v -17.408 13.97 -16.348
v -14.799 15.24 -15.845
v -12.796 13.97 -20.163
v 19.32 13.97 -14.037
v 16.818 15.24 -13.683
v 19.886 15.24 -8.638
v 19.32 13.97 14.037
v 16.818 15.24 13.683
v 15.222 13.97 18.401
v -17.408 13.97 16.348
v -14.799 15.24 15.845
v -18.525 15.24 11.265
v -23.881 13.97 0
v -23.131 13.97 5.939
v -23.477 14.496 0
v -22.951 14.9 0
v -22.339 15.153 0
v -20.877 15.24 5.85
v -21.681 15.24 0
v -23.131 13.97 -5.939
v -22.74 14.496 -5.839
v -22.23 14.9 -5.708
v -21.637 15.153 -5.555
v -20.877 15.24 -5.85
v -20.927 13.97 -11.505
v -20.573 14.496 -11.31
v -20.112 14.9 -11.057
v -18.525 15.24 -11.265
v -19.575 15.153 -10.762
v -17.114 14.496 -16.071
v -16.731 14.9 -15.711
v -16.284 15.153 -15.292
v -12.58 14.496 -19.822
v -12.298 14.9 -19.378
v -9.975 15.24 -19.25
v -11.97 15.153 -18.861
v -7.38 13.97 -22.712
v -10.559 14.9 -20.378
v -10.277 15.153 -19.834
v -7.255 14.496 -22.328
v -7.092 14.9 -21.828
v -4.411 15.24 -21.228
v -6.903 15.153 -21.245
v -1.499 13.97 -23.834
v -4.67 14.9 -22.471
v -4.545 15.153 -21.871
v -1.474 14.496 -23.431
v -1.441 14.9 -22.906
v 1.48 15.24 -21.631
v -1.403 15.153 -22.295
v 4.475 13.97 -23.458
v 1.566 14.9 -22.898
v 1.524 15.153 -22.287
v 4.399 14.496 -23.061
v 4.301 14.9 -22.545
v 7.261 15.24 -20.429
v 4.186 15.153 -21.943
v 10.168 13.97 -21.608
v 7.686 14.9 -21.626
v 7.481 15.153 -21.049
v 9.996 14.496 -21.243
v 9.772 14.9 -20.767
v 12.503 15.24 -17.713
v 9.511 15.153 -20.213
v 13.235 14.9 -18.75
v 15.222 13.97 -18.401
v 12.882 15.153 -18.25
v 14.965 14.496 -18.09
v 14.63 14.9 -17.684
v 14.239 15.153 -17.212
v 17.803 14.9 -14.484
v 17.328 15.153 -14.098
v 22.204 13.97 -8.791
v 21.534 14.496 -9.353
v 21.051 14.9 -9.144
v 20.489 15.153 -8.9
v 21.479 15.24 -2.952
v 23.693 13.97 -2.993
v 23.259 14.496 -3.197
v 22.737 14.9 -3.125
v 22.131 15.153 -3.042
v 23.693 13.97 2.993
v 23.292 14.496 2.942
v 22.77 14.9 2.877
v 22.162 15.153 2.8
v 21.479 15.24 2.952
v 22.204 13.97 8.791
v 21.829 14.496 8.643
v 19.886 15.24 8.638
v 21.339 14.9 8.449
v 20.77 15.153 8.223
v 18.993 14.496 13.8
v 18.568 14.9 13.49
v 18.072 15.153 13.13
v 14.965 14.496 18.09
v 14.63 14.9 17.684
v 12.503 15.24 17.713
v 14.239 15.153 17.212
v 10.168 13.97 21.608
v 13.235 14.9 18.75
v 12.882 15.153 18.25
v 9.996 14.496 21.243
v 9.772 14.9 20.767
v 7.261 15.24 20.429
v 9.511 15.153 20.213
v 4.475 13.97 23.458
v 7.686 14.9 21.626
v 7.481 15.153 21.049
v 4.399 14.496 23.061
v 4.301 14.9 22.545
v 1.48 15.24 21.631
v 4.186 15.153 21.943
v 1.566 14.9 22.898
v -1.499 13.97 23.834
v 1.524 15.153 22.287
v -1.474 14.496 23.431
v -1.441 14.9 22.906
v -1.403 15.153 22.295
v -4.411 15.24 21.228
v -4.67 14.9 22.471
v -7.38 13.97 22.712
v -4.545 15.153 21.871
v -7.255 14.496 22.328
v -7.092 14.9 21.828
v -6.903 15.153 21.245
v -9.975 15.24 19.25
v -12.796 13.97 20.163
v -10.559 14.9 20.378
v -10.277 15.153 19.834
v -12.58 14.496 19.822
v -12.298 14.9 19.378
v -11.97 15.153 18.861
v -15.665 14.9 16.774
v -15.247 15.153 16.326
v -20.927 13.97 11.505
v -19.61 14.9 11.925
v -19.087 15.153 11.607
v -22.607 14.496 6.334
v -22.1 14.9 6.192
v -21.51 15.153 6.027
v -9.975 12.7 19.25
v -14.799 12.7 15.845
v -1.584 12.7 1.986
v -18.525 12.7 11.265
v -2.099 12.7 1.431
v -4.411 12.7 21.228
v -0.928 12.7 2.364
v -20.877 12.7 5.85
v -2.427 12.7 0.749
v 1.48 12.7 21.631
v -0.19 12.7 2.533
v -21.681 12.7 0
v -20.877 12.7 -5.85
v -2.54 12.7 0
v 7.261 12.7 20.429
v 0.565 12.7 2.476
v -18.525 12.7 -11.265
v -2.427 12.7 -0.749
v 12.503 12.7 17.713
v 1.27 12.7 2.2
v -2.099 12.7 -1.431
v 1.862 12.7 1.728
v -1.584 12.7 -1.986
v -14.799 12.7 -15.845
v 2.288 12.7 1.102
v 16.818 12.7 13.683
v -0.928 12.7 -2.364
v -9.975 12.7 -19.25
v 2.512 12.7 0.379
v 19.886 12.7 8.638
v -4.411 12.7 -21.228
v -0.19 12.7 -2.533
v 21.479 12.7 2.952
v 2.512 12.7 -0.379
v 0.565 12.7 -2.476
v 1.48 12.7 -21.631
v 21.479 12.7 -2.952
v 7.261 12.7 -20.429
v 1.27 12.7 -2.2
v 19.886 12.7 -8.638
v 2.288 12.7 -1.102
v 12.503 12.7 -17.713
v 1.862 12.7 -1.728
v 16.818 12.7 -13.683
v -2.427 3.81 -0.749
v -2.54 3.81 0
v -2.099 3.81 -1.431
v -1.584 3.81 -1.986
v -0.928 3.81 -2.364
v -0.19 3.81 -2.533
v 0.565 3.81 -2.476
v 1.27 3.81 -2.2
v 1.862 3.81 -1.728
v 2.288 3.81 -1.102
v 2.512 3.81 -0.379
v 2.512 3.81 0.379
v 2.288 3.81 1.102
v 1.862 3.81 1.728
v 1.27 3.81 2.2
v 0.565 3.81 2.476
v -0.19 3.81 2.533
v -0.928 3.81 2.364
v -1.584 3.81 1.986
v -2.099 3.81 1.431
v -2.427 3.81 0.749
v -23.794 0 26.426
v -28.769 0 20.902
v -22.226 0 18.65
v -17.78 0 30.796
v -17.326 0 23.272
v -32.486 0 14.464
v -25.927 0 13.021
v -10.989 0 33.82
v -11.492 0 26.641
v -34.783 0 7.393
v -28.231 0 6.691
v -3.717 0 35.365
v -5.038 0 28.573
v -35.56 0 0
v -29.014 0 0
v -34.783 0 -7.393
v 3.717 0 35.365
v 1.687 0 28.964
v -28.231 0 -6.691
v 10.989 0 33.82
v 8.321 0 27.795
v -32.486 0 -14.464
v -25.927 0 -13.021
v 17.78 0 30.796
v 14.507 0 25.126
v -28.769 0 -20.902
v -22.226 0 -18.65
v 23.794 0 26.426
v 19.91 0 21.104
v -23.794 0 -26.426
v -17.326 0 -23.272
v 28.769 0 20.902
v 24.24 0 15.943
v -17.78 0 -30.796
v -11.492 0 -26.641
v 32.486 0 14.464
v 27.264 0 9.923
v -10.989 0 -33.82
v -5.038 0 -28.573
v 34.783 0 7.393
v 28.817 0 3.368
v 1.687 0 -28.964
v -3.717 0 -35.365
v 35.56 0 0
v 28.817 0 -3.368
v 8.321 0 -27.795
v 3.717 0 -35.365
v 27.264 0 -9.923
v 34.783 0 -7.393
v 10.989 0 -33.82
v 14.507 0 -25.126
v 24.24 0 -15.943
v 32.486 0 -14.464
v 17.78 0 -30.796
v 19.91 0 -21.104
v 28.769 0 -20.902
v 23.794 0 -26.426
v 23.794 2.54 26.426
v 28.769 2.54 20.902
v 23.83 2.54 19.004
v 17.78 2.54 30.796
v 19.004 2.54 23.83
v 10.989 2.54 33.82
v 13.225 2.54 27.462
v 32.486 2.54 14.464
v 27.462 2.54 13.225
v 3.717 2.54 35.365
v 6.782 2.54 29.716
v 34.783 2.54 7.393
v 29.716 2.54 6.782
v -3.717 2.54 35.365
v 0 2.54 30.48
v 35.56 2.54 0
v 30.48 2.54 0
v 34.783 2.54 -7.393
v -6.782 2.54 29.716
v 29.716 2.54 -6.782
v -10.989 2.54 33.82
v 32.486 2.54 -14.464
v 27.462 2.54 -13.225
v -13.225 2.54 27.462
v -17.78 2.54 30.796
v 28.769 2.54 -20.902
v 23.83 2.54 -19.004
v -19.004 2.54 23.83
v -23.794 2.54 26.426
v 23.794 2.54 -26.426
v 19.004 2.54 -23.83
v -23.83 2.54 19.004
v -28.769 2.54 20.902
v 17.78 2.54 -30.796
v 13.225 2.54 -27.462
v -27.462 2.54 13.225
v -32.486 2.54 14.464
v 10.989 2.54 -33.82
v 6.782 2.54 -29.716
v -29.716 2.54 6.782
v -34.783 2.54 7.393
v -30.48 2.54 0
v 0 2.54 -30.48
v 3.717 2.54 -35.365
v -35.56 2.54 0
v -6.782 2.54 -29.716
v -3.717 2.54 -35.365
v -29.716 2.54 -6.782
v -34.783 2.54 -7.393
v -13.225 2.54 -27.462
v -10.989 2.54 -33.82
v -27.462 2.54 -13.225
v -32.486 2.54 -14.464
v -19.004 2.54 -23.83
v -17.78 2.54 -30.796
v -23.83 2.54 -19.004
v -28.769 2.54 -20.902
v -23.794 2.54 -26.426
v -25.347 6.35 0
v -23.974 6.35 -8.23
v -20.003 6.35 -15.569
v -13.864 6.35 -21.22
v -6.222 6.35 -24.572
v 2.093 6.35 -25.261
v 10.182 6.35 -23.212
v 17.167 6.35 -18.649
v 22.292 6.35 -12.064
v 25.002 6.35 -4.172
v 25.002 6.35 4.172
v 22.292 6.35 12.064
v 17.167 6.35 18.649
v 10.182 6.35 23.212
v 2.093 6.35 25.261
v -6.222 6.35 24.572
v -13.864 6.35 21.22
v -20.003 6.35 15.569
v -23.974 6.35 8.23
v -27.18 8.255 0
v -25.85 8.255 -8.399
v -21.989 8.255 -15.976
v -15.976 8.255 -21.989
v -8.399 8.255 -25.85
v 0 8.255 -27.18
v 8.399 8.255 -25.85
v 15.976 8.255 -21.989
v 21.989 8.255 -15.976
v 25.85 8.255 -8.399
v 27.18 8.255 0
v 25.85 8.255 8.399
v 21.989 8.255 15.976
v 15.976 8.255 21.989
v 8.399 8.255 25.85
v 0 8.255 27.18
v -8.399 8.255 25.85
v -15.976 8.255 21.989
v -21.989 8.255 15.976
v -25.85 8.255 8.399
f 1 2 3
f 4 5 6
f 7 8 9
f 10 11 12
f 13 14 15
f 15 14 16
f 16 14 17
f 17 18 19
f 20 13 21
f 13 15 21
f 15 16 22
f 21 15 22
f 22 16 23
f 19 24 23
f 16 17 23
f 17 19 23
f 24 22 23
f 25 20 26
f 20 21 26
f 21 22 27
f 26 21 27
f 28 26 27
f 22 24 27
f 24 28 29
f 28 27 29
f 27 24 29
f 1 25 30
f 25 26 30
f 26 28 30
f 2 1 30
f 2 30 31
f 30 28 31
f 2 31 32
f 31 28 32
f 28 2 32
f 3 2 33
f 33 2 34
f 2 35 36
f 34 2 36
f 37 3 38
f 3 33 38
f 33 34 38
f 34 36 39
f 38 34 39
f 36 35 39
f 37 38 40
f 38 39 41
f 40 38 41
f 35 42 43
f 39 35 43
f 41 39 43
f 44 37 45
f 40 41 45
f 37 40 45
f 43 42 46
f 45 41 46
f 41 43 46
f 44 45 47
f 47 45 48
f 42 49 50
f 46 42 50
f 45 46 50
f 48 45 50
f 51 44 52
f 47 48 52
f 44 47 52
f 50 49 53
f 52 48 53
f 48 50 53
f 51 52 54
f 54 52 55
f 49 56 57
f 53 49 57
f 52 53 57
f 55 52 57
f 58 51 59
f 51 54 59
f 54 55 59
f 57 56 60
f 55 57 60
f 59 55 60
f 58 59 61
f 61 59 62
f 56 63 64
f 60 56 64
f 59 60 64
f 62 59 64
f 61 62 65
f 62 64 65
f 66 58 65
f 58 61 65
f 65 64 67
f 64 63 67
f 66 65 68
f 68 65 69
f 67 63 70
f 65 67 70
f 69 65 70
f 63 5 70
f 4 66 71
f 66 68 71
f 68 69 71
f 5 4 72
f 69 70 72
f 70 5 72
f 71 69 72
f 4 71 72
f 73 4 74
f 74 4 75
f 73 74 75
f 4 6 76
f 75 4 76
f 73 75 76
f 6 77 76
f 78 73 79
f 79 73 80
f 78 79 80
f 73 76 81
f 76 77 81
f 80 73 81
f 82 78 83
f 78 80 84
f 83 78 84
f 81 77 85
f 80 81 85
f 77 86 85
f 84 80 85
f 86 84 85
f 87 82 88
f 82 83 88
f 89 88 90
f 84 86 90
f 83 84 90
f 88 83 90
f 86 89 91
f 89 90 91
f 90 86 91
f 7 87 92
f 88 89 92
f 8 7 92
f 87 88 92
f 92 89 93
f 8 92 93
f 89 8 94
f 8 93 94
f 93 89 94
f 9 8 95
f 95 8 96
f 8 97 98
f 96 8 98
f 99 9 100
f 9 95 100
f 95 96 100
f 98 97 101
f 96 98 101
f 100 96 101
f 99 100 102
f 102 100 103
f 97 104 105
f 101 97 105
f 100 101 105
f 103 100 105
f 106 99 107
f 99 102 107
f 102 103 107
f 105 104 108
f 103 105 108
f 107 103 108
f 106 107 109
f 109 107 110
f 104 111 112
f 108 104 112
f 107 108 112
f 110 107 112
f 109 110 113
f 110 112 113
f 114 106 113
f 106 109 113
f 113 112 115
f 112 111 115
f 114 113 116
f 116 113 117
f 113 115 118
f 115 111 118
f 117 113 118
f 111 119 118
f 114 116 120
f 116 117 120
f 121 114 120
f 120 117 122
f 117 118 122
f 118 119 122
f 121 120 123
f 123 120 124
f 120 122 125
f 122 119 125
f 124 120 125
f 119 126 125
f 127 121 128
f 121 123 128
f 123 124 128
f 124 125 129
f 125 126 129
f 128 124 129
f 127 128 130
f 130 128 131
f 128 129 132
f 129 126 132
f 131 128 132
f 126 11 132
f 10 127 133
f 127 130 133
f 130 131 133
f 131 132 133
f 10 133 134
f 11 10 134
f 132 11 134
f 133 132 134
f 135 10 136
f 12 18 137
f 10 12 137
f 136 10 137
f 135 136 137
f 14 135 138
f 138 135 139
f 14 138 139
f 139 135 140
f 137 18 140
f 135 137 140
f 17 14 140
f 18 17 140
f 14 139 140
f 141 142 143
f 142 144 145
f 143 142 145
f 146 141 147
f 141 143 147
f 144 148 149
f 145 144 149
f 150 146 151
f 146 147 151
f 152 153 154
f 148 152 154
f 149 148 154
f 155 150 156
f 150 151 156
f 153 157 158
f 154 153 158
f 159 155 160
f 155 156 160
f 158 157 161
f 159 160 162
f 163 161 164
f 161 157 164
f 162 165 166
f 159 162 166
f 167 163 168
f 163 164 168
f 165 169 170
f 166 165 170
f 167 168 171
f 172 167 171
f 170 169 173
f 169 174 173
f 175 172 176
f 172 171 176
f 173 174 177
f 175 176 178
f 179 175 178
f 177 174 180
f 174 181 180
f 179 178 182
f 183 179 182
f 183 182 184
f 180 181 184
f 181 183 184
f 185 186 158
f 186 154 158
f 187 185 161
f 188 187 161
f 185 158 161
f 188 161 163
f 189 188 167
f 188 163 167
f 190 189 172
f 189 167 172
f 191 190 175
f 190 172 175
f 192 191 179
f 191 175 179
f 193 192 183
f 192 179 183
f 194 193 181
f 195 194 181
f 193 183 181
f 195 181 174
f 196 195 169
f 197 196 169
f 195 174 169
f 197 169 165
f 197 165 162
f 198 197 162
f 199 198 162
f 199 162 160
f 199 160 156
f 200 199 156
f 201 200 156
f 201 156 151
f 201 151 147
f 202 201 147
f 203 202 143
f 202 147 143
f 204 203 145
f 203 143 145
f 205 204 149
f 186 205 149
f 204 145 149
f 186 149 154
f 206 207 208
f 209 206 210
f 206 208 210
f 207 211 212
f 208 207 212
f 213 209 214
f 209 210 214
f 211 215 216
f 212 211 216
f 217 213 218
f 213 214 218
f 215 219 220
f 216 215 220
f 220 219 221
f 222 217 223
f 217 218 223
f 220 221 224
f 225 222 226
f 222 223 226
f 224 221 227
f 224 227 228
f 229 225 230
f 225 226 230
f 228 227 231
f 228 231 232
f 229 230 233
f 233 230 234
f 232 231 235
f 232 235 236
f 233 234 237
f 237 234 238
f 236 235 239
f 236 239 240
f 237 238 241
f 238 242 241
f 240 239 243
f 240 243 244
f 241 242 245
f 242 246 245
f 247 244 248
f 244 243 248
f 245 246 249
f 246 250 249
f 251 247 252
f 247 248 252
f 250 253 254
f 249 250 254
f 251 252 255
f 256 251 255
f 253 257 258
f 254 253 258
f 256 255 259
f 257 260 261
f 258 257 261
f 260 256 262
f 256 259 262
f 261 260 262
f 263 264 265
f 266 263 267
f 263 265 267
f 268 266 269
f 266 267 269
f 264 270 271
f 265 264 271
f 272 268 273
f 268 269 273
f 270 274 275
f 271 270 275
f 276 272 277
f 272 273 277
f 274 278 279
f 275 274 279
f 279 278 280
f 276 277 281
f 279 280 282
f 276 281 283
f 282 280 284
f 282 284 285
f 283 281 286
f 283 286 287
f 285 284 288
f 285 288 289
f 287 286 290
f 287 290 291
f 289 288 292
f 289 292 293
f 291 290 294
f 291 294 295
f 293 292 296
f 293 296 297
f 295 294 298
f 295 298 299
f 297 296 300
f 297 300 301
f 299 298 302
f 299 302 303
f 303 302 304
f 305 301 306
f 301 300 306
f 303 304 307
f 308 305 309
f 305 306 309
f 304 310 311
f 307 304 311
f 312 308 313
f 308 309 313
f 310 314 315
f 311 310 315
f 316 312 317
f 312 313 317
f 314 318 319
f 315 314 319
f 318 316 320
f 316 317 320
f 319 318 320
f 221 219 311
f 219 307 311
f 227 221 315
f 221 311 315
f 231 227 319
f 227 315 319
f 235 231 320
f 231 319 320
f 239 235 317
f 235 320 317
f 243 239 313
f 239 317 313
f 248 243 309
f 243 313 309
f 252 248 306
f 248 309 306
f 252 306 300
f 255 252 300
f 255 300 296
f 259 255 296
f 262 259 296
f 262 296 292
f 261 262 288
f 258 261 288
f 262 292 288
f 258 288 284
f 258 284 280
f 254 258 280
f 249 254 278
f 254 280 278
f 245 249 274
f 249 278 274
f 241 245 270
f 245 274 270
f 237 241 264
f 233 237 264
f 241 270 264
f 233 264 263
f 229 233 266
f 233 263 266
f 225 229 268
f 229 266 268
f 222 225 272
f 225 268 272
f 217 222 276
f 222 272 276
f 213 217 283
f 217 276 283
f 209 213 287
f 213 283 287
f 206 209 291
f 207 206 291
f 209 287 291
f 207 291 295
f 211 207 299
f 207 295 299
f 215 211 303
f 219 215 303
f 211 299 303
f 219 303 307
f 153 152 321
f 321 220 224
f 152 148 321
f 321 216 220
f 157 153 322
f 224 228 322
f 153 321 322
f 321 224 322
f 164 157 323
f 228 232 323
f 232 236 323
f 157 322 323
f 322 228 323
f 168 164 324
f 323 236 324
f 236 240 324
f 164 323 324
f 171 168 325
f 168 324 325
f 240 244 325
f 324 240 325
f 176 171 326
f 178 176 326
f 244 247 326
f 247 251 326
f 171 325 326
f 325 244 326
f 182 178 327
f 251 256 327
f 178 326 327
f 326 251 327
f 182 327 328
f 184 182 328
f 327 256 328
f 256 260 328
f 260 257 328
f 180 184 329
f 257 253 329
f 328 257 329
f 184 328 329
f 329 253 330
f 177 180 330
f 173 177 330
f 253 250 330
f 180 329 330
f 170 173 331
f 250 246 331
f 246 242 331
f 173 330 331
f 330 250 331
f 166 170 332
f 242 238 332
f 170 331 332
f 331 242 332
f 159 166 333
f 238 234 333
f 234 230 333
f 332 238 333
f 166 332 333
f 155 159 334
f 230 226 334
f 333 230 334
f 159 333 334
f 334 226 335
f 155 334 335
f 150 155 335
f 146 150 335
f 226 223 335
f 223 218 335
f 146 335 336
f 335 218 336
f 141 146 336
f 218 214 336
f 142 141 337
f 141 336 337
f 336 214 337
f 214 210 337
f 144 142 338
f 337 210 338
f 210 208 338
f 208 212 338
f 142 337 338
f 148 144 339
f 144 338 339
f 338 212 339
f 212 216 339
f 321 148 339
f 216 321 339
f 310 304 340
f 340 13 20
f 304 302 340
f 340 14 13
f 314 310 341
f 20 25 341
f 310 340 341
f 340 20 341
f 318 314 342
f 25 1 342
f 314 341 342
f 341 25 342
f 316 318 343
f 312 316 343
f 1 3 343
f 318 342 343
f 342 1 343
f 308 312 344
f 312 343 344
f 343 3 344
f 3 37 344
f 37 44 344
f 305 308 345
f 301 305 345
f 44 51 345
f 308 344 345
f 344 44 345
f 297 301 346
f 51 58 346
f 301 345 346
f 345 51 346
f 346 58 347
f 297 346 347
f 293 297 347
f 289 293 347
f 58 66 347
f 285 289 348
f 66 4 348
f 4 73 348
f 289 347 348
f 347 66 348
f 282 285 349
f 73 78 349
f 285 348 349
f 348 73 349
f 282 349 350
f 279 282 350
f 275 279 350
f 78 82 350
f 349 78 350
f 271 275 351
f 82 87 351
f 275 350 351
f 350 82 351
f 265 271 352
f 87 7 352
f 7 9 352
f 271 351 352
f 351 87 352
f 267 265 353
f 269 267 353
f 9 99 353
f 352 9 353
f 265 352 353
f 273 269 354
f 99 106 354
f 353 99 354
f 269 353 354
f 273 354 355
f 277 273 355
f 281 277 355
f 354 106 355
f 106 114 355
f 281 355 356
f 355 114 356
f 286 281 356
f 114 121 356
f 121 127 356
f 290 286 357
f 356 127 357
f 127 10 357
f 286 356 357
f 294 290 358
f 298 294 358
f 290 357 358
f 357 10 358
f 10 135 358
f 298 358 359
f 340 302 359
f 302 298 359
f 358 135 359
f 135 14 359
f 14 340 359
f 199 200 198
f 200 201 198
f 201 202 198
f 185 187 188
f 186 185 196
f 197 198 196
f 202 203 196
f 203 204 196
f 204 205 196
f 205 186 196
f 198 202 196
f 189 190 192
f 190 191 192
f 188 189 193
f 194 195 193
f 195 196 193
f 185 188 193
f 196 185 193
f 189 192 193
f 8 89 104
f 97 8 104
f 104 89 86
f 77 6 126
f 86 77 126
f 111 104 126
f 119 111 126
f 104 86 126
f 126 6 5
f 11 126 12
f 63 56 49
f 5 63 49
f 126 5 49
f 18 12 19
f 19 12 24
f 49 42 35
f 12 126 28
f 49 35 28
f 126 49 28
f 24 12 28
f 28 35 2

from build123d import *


with BuildPart() as part:
    # Sketch1 → Revolve1 (revolve)
    with BuildSketch(Plane.XY):
        with BuildLine():
            Line((-35.56, 0), (-35.56, 2.54))
            Line((-35.56, 2.54), (-30.48, 2.54))
            Line((-30.48, 2.54), (-23.880886423, 13.97))
            ThreePointArc((-23.880886423, 13.97), (-22.951181898, 14.899704526), (-21.681181898, 15.24))
            Line((-21.681181898, 15.24), (0, 15.24))
            Line((0, 15.24), (0, 3.81))
            Line((0, 3.81), (-2.54, 3.81))
            Line((-2.54, 3.81), (-2.54, 12.7))
            Line((-2.54, 12.7), (-21.681181898, 12.7))
            Line((-21.681181898, 12.7), (-29.013530316, 0))
            Line((-29.013530316, 0), (-35.56, 0))
        make_face()
    revolve(axis=Axis((0, 15.24, 0), (0, -1, 0)))


solid = part.part
